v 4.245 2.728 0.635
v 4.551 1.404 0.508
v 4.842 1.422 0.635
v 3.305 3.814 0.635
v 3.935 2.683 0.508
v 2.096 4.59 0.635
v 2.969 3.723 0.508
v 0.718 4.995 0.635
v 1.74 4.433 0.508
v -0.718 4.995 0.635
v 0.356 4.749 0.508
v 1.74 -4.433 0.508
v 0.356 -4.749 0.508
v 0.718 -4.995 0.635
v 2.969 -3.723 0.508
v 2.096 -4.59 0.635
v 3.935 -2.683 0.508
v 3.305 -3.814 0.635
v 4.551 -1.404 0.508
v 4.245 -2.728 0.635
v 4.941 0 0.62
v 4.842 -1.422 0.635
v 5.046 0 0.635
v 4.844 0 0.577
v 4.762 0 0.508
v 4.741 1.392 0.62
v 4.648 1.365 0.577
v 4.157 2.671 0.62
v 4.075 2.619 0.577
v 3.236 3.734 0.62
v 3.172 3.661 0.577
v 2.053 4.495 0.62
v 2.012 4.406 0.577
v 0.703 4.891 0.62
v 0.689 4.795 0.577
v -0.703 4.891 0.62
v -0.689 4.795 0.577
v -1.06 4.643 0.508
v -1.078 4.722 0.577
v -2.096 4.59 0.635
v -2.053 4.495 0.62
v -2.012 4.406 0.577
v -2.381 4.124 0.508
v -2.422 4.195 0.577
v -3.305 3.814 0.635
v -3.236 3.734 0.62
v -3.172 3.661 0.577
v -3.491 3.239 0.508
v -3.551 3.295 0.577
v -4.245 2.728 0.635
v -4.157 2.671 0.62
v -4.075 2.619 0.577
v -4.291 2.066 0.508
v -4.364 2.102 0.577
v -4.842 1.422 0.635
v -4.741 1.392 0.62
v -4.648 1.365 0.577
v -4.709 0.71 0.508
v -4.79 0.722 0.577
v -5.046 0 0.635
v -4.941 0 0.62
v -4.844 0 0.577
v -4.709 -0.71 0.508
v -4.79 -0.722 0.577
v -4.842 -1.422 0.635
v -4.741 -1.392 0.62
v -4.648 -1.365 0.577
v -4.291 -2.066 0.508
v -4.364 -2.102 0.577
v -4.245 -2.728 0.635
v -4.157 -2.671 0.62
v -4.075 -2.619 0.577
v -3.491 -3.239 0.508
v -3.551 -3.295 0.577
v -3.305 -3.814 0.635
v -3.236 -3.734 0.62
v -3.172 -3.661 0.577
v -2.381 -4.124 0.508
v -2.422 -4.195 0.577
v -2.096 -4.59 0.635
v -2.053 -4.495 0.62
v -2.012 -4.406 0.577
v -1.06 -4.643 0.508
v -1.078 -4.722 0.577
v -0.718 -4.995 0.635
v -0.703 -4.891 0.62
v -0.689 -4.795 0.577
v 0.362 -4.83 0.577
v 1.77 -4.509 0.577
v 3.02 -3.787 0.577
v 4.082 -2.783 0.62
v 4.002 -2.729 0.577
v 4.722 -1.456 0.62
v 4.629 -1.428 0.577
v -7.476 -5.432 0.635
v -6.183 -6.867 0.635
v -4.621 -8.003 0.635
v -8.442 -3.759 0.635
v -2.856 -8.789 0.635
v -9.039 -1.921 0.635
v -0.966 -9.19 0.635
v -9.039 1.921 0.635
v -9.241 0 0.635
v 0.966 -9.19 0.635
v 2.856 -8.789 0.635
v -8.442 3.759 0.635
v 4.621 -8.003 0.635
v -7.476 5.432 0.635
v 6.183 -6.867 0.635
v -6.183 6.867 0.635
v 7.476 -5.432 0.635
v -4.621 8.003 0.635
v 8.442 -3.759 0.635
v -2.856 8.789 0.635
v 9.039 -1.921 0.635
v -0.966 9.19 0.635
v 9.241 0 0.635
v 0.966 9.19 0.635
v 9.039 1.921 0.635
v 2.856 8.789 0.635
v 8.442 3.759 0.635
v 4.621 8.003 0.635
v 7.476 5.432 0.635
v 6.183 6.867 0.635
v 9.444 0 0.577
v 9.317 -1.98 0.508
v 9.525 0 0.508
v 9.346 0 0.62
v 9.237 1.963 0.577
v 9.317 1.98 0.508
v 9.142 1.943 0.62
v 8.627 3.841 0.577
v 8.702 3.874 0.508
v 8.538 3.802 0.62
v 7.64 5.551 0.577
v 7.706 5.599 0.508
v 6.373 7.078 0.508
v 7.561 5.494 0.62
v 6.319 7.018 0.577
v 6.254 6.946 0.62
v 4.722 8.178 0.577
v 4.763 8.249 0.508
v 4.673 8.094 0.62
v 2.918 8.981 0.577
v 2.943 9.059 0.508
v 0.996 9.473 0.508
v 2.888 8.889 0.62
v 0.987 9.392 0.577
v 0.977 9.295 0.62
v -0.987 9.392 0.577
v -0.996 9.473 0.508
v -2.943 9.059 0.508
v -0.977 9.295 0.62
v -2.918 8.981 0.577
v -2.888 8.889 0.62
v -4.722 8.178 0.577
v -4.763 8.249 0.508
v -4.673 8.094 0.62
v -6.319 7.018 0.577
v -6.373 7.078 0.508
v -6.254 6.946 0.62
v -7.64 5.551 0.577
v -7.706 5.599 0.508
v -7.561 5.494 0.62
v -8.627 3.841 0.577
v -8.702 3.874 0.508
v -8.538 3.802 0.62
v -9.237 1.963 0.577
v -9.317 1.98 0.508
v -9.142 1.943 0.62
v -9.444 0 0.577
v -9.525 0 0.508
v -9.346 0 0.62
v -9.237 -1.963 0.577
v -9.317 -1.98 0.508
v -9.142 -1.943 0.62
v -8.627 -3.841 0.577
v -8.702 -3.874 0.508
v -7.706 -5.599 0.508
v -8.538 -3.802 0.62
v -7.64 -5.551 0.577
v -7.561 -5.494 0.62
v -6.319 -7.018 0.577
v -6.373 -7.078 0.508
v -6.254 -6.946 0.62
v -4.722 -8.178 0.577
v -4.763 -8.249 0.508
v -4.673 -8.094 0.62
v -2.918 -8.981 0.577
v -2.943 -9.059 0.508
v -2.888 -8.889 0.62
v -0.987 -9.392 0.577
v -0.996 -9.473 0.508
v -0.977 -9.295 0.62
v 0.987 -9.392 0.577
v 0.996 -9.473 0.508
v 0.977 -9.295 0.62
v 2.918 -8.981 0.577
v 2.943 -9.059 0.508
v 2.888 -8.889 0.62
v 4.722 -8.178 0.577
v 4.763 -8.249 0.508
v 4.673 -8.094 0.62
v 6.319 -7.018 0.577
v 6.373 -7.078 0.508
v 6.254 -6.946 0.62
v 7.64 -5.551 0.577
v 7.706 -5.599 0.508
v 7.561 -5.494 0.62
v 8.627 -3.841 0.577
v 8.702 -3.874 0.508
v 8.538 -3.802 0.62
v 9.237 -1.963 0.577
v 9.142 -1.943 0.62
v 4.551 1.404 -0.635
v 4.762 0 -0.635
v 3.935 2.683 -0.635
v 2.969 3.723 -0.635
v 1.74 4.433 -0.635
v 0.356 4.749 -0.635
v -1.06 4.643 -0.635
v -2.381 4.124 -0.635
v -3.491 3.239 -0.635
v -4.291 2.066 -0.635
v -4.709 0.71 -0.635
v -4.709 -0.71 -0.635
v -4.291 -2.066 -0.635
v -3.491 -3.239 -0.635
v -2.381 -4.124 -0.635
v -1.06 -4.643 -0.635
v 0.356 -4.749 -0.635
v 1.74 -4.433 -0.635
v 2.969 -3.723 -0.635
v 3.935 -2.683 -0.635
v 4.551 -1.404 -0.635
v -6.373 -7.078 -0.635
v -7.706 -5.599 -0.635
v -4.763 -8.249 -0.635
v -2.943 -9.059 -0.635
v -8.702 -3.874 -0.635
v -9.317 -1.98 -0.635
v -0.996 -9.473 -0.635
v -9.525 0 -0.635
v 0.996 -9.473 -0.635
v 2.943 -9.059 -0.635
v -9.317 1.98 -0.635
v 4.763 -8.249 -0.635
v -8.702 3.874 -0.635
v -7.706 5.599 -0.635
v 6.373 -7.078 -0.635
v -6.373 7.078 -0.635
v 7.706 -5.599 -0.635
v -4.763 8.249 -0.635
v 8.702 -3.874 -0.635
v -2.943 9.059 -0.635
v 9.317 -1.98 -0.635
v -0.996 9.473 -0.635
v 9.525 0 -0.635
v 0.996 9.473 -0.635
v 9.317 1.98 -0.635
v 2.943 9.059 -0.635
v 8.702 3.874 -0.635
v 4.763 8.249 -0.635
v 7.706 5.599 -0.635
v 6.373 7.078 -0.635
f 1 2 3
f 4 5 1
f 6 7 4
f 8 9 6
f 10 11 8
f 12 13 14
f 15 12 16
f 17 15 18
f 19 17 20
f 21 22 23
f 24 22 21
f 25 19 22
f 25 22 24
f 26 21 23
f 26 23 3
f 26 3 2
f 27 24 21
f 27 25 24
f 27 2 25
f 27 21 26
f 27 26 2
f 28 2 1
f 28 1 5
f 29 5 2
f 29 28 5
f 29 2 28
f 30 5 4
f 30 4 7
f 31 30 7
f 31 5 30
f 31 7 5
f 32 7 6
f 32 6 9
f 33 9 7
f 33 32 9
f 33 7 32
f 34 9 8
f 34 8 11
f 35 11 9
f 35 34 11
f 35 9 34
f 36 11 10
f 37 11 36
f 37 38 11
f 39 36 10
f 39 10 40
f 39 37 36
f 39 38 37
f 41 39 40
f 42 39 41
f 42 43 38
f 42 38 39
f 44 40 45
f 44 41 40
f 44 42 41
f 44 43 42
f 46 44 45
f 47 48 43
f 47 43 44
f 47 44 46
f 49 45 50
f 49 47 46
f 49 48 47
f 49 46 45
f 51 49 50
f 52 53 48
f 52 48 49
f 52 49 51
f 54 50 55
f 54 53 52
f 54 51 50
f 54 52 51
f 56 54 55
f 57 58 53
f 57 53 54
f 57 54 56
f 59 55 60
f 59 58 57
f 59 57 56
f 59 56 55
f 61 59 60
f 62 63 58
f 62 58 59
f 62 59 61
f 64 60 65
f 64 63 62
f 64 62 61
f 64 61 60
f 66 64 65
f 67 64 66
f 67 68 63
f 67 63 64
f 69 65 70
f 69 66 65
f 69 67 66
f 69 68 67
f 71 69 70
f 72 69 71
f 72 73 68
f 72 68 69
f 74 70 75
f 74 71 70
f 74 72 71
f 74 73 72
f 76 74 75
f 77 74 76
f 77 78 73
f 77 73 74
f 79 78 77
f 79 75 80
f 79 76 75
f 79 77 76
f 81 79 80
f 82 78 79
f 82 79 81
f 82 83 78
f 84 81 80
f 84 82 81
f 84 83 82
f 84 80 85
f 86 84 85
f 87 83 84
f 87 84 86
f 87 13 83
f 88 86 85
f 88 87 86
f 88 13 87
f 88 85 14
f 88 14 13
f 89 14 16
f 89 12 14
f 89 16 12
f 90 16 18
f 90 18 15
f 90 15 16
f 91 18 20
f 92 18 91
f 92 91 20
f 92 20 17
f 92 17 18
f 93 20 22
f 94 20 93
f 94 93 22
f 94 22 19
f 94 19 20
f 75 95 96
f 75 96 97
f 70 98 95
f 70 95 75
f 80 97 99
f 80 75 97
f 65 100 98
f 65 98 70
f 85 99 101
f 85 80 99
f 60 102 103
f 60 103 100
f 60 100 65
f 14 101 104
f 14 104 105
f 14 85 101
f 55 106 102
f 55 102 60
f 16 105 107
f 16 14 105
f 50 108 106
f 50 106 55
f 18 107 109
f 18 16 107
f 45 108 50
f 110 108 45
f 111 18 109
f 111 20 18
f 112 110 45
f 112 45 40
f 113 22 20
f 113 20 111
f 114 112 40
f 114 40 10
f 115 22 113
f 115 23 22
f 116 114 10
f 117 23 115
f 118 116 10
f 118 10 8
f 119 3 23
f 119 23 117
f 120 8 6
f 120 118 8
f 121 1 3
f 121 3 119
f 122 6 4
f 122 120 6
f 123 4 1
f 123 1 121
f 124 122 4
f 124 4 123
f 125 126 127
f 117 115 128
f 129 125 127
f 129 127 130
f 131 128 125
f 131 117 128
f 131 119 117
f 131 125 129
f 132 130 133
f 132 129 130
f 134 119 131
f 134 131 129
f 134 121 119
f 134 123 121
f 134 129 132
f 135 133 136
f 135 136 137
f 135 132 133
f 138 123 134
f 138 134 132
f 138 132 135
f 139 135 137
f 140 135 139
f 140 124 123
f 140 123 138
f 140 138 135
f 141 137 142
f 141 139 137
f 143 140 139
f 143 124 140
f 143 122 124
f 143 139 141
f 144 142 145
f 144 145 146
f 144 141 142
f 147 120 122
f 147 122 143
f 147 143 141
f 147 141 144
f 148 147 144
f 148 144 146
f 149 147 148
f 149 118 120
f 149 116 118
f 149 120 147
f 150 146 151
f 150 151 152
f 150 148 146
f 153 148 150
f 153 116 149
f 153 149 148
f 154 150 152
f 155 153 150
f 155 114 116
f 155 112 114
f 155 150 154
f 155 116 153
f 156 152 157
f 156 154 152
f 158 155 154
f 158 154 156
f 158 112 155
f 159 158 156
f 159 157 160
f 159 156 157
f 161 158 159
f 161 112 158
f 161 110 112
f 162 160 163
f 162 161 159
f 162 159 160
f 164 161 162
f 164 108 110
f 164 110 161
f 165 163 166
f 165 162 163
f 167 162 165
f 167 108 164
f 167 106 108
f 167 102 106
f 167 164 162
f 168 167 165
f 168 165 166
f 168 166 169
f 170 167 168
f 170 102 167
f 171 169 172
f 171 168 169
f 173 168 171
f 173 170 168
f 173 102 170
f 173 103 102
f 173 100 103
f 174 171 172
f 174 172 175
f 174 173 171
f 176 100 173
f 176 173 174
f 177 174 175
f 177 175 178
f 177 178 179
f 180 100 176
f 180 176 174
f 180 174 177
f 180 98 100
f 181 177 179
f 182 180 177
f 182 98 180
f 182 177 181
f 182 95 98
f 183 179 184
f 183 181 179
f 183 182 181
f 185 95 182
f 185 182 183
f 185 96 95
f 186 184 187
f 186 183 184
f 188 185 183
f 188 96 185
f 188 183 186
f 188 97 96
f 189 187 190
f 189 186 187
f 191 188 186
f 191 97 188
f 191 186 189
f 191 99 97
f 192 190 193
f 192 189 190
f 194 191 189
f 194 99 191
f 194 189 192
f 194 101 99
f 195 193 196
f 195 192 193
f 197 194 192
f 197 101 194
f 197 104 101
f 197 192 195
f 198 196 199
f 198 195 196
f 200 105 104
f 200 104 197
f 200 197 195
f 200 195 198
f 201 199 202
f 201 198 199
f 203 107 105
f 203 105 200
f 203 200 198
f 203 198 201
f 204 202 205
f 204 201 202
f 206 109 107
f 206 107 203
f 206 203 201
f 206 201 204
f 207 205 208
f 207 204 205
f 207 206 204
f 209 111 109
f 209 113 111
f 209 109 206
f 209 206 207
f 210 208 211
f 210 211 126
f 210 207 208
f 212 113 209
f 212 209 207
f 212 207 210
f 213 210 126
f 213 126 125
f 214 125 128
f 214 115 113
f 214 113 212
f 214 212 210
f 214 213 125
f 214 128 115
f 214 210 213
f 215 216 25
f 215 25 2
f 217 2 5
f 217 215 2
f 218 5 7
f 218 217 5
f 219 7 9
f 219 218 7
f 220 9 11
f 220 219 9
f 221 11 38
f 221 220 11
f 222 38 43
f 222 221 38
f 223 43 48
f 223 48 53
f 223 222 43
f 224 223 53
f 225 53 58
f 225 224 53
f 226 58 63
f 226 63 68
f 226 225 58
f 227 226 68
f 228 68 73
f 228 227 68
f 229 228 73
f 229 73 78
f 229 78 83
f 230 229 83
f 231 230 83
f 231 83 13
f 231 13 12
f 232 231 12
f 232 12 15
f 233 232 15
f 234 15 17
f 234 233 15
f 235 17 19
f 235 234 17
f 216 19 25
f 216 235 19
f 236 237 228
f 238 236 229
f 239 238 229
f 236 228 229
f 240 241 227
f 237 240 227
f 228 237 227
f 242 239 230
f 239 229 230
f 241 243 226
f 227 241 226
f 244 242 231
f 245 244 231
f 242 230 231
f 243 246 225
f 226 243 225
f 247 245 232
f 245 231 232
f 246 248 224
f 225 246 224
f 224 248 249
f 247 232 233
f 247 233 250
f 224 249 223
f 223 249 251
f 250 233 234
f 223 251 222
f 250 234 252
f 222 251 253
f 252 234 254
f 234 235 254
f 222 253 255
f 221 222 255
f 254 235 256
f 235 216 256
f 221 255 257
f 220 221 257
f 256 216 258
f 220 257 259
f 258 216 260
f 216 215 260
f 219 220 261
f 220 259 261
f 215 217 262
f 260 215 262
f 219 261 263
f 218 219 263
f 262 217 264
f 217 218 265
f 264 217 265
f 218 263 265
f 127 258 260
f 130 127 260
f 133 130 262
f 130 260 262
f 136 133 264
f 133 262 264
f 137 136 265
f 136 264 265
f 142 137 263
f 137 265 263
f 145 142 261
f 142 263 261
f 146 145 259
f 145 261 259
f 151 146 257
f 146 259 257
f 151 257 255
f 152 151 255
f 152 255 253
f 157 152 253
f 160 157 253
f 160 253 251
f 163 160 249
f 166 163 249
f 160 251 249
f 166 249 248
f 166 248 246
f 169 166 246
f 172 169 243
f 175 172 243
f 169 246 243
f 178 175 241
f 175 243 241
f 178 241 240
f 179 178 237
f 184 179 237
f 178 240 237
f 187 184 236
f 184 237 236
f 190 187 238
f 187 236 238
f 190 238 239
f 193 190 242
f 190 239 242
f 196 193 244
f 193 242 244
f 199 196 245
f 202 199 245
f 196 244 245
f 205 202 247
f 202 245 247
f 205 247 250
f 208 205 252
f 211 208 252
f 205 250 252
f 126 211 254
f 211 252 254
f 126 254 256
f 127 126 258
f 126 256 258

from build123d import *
from OCP.BRepFilletAPI import BRepFilletAPI_MakeChamfer

# Parameters (mm, degrees)
BOSS_EXTRUDE1_START = -0.635
SKETCH3_R           = 9.525
SKETCH3_R_2         = 4.7625
BOSS_EXTRUDE1_DEPTH = 1.27
CHAMFER1_SIZE       = 0.127
CHAMFER1_SIZE2      = 0.073323484
FILLET1_R           = 0.381


with BuildPart() as part:
    # Sketch3 → Boss-Extrude1 (new body)
    with BuildSketch(Plane.XY.offset(BOSS_EXTRUDE1_START)):
        Circle(SKETCH3_R)
        Circle(SKETCH3_R_2, mode=Mode.SUBTRACT)
    extrude(amount=BOSS_EXTRUDE1_DEPTH)

    # Chamfer1: one chamfer whose edges measure the first distance from different faces: ONE call of the kernel's chamfer builder (chamfer() names one face for all edges)
    chamfer1_edges_1 = [part.edges().sort_by_distance(p)[0] for p in [
        (-9.525, 0, 0.635),
    ]]
    chamfer1_side_1 = [part.faces().sort_by_distance(p)[0] for p in [
        (-9.525, 0, 0),
    ]]
    chamfer1_edges_2 = [part.edges().sort_by_distance(p)[0] for p in [
        (-4.7625, 0, 0.635),
    ]]
    chamfer1_side_2 = [part.faces().sort_by_distance(p)[0] for p in [
        (-4.7625, 0, 0),
    ]]
    chamfer1 = BRepFilletAPI_MakeChamfer(part.part.solid().wrapped)
    for e in chamfer1_edges_1:
        chamfer1.Add(CHAMFER1_SIZE, CHAMFER1_SIZE2, e.wrapped, chamfer1_side_1[0].wrapped)  # the first distance lies on this face
    for e in chamfer1_edges_2:
        chamfer1.Add(CHAMFER1_SIZE, CHAMFER1_SIZE2, e.wrapped, chamfer1_side_2[0].wrapped)  # the first distance lies on this face
    add(Compound.cast(chamfer1.Shape()), mode=Mode.REPLACE)

    # Fillet1
    # the kernel refuses this fillet: 0.381 mm, written as the material it takes off along each edge
    with BuildSketch(Plane(origin=(0, 0, 0.635), x_dir=(1, 0, 0), z_dir=(0, -1, 0))) as fillet1_piece_1:
        with BuildLine():
            CenterArc((9.241019367, -0.381), FILLET1_R, 41.810314896, 48.189685104)
            Line((9.241019367, 0), (9.241019367, 0.00762))
            Line((9.241019367, 0.00762), (9.451676516, 0.00762))
            Line((9.451676516, 0.00762), (9.458275629, 0.00381))
            ThreePointArc((9.458275629, 0.00381), (9.494937371, -0.05969), (9.530679613, -0.12192))
            Line((9.530679613, -0.12192), (9.525, -0.127))
        make_face()
    revolve(axis=Axis((0, 0, 0.635), (0, 0, 1)), mode=Mode.SUBTRACT)
    with BuildSketch(Plane(origin=(0, 0, 0.635), x_dir=(1, 0, 0), z_dir=(0, -1, 0))) as fillet1_piece_2:
        with BuildLine():
            CenterArc((5.046480633, -0.381), FILLET1_R, 90, 48.189685104)
            Line((4.7625, -0.127), (4.756820387, -0.12192))
            ThreePointArc((4.756820387, -0.12192), (4.792562629, -0.05969), (4.829224371, 0.00381))
            Line((4.829224371, 0.00381), (4.835823484, 0.00762))
            Line((4.835823484, 0.00762), (5.046480633, 0.00762))
            Line((5.046480633, 0.00762), (5.046480633, 0))
        make_face()
    revolve(axis=Axis((0, 0, 0.635), (0, 0, 1)), mode=Mode.SUBTRACT)


solid = part.part
